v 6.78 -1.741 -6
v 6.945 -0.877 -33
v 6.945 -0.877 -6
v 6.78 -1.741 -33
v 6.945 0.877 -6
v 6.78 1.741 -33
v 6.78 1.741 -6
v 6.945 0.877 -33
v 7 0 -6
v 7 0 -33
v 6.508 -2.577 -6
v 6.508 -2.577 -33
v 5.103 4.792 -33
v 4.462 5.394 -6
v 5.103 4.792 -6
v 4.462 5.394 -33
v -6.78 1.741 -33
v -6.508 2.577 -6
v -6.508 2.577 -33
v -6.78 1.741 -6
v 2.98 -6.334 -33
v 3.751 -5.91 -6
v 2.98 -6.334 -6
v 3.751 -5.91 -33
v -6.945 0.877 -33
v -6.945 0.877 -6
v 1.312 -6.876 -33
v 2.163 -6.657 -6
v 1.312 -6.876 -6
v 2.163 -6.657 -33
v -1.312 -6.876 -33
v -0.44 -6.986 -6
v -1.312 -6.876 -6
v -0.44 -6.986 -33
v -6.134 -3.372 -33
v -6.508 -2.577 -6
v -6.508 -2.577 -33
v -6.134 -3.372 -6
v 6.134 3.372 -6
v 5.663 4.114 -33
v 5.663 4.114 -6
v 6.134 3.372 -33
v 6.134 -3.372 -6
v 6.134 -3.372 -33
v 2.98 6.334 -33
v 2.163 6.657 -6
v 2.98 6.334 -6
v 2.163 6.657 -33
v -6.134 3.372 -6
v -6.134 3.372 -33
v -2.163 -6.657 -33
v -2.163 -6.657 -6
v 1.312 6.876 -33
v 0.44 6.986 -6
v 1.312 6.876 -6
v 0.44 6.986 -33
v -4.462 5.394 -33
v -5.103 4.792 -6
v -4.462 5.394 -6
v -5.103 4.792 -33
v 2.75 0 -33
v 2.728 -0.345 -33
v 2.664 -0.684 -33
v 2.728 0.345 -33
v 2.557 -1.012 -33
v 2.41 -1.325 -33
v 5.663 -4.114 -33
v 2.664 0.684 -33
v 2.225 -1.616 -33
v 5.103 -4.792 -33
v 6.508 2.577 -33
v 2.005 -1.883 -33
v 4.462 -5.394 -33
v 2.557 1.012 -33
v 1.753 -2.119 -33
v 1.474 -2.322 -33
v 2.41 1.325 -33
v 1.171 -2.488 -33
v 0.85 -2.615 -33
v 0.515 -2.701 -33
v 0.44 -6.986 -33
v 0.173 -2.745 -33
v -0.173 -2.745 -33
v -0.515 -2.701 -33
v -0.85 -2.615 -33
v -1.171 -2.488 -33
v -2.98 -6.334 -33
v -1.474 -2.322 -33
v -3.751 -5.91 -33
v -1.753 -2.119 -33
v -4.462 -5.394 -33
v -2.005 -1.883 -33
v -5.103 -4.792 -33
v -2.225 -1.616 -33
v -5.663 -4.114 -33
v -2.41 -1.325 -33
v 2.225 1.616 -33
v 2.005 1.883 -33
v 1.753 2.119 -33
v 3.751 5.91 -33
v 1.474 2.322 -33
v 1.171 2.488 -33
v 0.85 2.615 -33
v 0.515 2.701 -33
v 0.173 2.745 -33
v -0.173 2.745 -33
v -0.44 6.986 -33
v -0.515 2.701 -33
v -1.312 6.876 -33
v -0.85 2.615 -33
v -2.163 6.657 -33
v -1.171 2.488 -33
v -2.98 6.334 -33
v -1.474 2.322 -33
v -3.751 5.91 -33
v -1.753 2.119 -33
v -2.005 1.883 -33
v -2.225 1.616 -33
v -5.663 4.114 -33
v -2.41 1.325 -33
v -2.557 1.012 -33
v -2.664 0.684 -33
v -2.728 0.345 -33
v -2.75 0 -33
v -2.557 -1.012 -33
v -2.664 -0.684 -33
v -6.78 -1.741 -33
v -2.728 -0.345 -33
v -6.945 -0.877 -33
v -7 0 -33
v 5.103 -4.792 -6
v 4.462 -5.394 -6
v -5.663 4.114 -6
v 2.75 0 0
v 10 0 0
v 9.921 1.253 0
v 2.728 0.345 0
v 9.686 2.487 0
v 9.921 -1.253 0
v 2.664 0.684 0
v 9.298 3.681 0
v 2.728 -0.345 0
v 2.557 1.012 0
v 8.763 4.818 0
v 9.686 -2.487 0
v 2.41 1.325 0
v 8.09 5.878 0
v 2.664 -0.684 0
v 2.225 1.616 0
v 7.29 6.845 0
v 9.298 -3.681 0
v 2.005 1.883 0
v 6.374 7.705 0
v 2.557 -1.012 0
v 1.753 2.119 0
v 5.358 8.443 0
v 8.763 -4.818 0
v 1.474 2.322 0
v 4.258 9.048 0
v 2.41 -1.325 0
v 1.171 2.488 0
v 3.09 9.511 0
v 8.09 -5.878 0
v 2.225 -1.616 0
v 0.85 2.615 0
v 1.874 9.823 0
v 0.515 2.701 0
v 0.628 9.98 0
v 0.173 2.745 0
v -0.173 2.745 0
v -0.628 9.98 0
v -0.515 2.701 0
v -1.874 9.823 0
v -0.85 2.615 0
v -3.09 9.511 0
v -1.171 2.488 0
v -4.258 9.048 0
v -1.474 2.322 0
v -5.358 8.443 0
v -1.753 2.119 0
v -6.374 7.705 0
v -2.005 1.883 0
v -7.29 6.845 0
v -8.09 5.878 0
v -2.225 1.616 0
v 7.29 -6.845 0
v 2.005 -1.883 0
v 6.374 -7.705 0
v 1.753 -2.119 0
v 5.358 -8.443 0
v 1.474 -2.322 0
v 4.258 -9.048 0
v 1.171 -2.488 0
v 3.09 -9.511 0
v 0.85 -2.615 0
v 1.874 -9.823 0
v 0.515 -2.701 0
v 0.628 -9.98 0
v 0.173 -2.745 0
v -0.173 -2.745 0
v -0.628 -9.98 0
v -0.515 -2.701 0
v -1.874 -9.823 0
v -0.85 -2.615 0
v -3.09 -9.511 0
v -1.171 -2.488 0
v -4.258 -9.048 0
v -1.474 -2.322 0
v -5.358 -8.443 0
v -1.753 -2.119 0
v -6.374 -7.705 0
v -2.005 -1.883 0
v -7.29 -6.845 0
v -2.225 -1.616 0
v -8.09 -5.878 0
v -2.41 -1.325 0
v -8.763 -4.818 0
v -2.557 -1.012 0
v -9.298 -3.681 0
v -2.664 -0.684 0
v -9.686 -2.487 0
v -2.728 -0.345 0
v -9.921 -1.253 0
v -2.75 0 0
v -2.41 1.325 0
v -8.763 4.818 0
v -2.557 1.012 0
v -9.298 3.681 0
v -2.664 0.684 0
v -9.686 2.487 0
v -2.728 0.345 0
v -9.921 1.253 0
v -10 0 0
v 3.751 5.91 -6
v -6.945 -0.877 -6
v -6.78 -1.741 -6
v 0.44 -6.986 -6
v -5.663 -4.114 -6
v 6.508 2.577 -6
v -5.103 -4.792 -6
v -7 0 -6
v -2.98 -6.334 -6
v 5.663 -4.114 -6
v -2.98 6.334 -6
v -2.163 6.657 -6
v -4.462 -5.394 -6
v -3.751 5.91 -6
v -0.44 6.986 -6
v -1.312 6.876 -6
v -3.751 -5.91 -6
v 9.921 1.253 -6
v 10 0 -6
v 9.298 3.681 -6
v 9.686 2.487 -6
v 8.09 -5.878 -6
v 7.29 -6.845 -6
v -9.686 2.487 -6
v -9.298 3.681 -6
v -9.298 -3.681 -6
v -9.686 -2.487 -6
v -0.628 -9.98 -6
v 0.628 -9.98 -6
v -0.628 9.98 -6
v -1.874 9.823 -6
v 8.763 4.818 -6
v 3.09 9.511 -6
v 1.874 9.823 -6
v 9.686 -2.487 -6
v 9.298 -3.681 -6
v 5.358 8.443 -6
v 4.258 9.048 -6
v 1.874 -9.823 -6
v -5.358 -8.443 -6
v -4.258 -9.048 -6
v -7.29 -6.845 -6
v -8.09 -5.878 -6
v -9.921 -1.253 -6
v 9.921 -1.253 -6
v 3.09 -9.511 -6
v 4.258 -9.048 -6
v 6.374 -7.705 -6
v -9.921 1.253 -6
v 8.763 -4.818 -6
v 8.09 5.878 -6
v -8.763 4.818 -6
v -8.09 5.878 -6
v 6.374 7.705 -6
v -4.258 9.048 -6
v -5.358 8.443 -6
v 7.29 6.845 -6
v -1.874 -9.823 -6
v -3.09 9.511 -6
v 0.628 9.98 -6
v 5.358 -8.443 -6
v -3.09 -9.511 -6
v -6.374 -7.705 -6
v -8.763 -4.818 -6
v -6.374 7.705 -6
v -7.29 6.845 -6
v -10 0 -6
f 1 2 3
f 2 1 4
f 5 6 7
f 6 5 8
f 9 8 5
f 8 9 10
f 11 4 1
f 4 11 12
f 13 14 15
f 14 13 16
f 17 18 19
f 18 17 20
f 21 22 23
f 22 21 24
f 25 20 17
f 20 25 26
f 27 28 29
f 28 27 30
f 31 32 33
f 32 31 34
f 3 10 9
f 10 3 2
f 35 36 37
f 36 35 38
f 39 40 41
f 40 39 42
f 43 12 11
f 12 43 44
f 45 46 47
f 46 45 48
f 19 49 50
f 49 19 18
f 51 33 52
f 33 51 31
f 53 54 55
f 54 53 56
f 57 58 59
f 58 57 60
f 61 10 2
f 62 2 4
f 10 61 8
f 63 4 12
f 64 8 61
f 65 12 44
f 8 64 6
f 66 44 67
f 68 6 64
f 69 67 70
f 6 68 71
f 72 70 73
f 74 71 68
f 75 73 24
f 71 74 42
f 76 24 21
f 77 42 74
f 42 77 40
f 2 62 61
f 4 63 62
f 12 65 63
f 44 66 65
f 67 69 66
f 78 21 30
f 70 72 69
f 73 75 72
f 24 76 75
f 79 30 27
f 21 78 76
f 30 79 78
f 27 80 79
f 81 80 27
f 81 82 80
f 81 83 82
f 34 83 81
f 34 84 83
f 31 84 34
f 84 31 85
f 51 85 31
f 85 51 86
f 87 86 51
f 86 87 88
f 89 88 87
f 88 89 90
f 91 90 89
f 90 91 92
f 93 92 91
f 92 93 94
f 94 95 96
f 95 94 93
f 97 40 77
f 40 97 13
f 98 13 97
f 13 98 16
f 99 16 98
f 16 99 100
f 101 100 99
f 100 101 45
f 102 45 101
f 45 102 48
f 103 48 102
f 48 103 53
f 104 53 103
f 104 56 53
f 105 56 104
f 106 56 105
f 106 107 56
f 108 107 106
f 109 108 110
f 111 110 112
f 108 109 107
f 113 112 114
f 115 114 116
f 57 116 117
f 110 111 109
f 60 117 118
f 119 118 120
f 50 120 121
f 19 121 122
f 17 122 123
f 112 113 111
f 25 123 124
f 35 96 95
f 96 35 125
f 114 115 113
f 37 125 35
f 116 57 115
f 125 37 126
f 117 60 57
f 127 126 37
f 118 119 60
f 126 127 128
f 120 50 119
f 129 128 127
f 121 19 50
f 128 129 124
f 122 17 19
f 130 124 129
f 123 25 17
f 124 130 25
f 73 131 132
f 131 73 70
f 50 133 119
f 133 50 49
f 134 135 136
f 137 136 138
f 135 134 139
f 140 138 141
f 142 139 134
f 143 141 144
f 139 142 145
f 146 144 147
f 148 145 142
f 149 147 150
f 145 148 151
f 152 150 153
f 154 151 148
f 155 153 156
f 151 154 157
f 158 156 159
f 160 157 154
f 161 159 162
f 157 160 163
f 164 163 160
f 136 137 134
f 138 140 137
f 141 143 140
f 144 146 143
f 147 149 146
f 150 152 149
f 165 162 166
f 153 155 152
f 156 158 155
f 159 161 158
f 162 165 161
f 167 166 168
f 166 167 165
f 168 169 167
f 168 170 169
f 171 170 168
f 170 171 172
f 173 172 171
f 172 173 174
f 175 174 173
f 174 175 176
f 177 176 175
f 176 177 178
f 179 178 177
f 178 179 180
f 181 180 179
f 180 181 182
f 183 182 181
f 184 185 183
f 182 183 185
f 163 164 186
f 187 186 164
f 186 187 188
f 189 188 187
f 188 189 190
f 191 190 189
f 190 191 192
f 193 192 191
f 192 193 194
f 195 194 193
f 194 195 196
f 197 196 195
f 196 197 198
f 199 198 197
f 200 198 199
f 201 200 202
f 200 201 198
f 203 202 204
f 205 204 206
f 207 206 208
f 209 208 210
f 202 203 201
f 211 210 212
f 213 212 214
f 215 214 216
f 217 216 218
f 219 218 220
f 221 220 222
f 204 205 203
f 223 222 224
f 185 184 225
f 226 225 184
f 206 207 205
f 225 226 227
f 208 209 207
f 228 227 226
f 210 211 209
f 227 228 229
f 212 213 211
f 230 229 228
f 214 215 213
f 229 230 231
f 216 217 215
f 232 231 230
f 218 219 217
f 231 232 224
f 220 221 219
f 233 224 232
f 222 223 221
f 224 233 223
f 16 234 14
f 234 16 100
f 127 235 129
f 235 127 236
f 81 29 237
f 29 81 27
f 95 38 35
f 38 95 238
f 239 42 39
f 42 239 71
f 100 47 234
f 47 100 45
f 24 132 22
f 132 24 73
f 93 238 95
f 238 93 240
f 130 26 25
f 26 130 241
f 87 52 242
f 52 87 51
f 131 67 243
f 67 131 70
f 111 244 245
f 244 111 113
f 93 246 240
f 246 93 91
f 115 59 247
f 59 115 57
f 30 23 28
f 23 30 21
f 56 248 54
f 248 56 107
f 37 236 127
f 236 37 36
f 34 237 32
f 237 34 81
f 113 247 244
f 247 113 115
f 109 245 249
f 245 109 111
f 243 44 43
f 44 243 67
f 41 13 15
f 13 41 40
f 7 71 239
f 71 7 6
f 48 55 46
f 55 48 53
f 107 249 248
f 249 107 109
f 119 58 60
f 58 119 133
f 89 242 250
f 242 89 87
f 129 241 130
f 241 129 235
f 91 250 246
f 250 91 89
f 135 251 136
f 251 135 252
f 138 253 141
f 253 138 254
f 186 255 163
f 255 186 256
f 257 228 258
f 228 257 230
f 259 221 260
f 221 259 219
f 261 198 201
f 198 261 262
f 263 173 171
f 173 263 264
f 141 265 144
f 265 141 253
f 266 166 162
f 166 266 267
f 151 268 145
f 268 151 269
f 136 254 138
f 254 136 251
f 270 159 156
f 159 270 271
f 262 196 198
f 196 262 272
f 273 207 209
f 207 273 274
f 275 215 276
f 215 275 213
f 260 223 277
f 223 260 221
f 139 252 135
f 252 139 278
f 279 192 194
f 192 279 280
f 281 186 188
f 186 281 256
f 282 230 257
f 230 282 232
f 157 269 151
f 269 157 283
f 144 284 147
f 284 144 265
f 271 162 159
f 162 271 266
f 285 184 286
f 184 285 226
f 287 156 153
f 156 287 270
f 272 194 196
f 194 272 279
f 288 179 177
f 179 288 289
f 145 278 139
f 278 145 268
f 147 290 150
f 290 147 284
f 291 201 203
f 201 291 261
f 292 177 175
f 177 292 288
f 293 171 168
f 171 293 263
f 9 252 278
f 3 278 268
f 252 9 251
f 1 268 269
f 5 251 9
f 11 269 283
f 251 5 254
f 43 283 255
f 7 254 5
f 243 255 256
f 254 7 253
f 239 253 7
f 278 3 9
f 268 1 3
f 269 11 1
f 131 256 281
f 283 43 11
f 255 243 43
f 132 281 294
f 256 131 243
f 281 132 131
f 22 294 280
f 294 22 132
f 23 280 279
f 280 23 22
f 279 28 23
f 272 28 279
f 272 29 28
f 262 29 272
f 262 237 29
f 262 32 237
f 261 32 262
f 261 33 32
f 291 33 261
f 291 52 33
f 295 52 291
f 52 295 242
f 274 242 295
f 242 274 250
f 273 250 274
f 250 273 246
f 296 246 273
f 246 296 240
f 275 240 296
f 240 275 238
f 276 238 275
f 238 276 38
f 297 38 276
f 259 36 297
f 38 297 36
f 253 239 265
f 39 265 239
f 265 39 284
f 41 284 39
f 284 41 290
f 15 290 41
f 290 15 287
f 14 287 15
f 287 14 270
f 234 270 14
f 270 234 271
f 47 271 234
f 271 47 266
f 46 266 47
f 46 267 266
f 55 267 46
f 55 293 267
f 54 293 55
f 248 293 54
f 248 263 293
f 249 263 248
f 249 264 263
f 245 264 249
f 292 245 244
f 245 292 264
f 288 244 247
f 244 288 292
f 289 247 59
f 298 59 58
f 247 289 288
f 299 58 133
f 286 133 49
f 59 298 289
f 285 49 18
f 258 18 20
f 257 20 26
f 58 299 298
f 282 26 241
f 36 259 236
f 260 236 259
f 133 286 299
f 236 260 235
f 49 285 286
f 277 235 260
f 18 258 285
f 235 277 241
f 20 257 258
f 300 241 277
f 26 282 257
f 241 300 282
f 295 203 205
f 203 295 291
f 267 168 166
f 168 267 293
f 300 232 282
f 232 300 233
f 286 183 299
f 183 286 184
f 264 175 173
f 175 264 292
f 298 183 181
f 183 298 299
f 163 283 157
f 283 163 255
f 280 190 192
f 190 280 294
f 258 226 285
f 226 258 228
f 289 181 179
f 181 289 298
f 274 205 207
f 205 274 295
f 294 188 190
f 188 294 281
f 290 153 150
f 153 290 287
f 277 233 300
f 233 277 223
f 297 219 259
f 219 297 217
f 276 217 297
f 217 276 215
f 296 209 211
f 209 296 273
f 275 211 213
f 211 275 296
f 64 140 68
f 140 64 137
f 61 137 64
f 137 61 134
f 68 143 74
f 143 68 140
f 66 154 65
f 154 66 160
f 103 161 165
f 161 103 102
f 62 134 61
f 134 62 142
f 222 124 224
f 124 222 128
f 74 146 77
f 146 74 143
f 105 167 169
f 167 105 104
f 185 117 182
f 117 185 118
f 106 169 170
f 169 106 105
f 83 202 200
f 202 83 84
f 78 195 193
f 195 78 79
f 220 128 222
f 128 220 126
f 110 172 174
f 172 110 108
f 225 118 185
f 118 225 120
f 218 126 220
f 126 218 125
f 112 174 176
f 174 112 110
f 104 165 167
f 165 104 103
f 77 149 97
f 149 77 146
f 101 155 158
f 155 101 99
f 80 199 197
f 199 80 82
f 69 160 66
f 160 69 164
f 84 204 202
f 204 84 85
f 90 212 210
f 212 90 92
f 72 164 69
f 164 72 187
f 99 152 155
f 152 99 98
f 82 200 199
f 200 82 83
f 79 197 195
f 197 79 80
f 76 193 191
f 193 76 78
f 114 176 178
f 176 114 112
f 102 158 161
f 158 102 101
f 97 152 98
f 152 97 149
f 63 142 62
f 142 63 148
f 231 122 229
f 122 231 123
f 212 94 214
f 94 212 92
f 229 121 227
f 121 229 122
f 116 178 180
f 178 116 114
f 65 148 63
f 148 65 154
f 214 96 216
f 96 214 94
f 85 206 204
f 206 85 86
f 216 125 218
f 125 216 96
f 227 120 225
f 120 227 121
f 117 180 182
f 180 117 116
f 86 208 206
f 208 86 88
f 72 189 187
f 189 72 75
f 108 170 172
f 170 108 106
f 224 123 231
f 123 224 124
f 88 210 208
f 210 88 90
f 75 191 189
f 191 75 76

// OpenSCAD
$fn = 50;


difference() {
	union() {
		translate(v = [0, 0, -33.0000000000]) {
			cylinder(h = 33, r = 7.0000000000);
		}
		translate(v = [0, 0, -6.0000000000]) {
			cylinder(h = 6, r = 10.0000000000);
		}
	}
	union() {
		#translate(v = [0, 0, -33]) {
			cylinder(h = 33, r = 2.7500000000);
		}
	}
}
